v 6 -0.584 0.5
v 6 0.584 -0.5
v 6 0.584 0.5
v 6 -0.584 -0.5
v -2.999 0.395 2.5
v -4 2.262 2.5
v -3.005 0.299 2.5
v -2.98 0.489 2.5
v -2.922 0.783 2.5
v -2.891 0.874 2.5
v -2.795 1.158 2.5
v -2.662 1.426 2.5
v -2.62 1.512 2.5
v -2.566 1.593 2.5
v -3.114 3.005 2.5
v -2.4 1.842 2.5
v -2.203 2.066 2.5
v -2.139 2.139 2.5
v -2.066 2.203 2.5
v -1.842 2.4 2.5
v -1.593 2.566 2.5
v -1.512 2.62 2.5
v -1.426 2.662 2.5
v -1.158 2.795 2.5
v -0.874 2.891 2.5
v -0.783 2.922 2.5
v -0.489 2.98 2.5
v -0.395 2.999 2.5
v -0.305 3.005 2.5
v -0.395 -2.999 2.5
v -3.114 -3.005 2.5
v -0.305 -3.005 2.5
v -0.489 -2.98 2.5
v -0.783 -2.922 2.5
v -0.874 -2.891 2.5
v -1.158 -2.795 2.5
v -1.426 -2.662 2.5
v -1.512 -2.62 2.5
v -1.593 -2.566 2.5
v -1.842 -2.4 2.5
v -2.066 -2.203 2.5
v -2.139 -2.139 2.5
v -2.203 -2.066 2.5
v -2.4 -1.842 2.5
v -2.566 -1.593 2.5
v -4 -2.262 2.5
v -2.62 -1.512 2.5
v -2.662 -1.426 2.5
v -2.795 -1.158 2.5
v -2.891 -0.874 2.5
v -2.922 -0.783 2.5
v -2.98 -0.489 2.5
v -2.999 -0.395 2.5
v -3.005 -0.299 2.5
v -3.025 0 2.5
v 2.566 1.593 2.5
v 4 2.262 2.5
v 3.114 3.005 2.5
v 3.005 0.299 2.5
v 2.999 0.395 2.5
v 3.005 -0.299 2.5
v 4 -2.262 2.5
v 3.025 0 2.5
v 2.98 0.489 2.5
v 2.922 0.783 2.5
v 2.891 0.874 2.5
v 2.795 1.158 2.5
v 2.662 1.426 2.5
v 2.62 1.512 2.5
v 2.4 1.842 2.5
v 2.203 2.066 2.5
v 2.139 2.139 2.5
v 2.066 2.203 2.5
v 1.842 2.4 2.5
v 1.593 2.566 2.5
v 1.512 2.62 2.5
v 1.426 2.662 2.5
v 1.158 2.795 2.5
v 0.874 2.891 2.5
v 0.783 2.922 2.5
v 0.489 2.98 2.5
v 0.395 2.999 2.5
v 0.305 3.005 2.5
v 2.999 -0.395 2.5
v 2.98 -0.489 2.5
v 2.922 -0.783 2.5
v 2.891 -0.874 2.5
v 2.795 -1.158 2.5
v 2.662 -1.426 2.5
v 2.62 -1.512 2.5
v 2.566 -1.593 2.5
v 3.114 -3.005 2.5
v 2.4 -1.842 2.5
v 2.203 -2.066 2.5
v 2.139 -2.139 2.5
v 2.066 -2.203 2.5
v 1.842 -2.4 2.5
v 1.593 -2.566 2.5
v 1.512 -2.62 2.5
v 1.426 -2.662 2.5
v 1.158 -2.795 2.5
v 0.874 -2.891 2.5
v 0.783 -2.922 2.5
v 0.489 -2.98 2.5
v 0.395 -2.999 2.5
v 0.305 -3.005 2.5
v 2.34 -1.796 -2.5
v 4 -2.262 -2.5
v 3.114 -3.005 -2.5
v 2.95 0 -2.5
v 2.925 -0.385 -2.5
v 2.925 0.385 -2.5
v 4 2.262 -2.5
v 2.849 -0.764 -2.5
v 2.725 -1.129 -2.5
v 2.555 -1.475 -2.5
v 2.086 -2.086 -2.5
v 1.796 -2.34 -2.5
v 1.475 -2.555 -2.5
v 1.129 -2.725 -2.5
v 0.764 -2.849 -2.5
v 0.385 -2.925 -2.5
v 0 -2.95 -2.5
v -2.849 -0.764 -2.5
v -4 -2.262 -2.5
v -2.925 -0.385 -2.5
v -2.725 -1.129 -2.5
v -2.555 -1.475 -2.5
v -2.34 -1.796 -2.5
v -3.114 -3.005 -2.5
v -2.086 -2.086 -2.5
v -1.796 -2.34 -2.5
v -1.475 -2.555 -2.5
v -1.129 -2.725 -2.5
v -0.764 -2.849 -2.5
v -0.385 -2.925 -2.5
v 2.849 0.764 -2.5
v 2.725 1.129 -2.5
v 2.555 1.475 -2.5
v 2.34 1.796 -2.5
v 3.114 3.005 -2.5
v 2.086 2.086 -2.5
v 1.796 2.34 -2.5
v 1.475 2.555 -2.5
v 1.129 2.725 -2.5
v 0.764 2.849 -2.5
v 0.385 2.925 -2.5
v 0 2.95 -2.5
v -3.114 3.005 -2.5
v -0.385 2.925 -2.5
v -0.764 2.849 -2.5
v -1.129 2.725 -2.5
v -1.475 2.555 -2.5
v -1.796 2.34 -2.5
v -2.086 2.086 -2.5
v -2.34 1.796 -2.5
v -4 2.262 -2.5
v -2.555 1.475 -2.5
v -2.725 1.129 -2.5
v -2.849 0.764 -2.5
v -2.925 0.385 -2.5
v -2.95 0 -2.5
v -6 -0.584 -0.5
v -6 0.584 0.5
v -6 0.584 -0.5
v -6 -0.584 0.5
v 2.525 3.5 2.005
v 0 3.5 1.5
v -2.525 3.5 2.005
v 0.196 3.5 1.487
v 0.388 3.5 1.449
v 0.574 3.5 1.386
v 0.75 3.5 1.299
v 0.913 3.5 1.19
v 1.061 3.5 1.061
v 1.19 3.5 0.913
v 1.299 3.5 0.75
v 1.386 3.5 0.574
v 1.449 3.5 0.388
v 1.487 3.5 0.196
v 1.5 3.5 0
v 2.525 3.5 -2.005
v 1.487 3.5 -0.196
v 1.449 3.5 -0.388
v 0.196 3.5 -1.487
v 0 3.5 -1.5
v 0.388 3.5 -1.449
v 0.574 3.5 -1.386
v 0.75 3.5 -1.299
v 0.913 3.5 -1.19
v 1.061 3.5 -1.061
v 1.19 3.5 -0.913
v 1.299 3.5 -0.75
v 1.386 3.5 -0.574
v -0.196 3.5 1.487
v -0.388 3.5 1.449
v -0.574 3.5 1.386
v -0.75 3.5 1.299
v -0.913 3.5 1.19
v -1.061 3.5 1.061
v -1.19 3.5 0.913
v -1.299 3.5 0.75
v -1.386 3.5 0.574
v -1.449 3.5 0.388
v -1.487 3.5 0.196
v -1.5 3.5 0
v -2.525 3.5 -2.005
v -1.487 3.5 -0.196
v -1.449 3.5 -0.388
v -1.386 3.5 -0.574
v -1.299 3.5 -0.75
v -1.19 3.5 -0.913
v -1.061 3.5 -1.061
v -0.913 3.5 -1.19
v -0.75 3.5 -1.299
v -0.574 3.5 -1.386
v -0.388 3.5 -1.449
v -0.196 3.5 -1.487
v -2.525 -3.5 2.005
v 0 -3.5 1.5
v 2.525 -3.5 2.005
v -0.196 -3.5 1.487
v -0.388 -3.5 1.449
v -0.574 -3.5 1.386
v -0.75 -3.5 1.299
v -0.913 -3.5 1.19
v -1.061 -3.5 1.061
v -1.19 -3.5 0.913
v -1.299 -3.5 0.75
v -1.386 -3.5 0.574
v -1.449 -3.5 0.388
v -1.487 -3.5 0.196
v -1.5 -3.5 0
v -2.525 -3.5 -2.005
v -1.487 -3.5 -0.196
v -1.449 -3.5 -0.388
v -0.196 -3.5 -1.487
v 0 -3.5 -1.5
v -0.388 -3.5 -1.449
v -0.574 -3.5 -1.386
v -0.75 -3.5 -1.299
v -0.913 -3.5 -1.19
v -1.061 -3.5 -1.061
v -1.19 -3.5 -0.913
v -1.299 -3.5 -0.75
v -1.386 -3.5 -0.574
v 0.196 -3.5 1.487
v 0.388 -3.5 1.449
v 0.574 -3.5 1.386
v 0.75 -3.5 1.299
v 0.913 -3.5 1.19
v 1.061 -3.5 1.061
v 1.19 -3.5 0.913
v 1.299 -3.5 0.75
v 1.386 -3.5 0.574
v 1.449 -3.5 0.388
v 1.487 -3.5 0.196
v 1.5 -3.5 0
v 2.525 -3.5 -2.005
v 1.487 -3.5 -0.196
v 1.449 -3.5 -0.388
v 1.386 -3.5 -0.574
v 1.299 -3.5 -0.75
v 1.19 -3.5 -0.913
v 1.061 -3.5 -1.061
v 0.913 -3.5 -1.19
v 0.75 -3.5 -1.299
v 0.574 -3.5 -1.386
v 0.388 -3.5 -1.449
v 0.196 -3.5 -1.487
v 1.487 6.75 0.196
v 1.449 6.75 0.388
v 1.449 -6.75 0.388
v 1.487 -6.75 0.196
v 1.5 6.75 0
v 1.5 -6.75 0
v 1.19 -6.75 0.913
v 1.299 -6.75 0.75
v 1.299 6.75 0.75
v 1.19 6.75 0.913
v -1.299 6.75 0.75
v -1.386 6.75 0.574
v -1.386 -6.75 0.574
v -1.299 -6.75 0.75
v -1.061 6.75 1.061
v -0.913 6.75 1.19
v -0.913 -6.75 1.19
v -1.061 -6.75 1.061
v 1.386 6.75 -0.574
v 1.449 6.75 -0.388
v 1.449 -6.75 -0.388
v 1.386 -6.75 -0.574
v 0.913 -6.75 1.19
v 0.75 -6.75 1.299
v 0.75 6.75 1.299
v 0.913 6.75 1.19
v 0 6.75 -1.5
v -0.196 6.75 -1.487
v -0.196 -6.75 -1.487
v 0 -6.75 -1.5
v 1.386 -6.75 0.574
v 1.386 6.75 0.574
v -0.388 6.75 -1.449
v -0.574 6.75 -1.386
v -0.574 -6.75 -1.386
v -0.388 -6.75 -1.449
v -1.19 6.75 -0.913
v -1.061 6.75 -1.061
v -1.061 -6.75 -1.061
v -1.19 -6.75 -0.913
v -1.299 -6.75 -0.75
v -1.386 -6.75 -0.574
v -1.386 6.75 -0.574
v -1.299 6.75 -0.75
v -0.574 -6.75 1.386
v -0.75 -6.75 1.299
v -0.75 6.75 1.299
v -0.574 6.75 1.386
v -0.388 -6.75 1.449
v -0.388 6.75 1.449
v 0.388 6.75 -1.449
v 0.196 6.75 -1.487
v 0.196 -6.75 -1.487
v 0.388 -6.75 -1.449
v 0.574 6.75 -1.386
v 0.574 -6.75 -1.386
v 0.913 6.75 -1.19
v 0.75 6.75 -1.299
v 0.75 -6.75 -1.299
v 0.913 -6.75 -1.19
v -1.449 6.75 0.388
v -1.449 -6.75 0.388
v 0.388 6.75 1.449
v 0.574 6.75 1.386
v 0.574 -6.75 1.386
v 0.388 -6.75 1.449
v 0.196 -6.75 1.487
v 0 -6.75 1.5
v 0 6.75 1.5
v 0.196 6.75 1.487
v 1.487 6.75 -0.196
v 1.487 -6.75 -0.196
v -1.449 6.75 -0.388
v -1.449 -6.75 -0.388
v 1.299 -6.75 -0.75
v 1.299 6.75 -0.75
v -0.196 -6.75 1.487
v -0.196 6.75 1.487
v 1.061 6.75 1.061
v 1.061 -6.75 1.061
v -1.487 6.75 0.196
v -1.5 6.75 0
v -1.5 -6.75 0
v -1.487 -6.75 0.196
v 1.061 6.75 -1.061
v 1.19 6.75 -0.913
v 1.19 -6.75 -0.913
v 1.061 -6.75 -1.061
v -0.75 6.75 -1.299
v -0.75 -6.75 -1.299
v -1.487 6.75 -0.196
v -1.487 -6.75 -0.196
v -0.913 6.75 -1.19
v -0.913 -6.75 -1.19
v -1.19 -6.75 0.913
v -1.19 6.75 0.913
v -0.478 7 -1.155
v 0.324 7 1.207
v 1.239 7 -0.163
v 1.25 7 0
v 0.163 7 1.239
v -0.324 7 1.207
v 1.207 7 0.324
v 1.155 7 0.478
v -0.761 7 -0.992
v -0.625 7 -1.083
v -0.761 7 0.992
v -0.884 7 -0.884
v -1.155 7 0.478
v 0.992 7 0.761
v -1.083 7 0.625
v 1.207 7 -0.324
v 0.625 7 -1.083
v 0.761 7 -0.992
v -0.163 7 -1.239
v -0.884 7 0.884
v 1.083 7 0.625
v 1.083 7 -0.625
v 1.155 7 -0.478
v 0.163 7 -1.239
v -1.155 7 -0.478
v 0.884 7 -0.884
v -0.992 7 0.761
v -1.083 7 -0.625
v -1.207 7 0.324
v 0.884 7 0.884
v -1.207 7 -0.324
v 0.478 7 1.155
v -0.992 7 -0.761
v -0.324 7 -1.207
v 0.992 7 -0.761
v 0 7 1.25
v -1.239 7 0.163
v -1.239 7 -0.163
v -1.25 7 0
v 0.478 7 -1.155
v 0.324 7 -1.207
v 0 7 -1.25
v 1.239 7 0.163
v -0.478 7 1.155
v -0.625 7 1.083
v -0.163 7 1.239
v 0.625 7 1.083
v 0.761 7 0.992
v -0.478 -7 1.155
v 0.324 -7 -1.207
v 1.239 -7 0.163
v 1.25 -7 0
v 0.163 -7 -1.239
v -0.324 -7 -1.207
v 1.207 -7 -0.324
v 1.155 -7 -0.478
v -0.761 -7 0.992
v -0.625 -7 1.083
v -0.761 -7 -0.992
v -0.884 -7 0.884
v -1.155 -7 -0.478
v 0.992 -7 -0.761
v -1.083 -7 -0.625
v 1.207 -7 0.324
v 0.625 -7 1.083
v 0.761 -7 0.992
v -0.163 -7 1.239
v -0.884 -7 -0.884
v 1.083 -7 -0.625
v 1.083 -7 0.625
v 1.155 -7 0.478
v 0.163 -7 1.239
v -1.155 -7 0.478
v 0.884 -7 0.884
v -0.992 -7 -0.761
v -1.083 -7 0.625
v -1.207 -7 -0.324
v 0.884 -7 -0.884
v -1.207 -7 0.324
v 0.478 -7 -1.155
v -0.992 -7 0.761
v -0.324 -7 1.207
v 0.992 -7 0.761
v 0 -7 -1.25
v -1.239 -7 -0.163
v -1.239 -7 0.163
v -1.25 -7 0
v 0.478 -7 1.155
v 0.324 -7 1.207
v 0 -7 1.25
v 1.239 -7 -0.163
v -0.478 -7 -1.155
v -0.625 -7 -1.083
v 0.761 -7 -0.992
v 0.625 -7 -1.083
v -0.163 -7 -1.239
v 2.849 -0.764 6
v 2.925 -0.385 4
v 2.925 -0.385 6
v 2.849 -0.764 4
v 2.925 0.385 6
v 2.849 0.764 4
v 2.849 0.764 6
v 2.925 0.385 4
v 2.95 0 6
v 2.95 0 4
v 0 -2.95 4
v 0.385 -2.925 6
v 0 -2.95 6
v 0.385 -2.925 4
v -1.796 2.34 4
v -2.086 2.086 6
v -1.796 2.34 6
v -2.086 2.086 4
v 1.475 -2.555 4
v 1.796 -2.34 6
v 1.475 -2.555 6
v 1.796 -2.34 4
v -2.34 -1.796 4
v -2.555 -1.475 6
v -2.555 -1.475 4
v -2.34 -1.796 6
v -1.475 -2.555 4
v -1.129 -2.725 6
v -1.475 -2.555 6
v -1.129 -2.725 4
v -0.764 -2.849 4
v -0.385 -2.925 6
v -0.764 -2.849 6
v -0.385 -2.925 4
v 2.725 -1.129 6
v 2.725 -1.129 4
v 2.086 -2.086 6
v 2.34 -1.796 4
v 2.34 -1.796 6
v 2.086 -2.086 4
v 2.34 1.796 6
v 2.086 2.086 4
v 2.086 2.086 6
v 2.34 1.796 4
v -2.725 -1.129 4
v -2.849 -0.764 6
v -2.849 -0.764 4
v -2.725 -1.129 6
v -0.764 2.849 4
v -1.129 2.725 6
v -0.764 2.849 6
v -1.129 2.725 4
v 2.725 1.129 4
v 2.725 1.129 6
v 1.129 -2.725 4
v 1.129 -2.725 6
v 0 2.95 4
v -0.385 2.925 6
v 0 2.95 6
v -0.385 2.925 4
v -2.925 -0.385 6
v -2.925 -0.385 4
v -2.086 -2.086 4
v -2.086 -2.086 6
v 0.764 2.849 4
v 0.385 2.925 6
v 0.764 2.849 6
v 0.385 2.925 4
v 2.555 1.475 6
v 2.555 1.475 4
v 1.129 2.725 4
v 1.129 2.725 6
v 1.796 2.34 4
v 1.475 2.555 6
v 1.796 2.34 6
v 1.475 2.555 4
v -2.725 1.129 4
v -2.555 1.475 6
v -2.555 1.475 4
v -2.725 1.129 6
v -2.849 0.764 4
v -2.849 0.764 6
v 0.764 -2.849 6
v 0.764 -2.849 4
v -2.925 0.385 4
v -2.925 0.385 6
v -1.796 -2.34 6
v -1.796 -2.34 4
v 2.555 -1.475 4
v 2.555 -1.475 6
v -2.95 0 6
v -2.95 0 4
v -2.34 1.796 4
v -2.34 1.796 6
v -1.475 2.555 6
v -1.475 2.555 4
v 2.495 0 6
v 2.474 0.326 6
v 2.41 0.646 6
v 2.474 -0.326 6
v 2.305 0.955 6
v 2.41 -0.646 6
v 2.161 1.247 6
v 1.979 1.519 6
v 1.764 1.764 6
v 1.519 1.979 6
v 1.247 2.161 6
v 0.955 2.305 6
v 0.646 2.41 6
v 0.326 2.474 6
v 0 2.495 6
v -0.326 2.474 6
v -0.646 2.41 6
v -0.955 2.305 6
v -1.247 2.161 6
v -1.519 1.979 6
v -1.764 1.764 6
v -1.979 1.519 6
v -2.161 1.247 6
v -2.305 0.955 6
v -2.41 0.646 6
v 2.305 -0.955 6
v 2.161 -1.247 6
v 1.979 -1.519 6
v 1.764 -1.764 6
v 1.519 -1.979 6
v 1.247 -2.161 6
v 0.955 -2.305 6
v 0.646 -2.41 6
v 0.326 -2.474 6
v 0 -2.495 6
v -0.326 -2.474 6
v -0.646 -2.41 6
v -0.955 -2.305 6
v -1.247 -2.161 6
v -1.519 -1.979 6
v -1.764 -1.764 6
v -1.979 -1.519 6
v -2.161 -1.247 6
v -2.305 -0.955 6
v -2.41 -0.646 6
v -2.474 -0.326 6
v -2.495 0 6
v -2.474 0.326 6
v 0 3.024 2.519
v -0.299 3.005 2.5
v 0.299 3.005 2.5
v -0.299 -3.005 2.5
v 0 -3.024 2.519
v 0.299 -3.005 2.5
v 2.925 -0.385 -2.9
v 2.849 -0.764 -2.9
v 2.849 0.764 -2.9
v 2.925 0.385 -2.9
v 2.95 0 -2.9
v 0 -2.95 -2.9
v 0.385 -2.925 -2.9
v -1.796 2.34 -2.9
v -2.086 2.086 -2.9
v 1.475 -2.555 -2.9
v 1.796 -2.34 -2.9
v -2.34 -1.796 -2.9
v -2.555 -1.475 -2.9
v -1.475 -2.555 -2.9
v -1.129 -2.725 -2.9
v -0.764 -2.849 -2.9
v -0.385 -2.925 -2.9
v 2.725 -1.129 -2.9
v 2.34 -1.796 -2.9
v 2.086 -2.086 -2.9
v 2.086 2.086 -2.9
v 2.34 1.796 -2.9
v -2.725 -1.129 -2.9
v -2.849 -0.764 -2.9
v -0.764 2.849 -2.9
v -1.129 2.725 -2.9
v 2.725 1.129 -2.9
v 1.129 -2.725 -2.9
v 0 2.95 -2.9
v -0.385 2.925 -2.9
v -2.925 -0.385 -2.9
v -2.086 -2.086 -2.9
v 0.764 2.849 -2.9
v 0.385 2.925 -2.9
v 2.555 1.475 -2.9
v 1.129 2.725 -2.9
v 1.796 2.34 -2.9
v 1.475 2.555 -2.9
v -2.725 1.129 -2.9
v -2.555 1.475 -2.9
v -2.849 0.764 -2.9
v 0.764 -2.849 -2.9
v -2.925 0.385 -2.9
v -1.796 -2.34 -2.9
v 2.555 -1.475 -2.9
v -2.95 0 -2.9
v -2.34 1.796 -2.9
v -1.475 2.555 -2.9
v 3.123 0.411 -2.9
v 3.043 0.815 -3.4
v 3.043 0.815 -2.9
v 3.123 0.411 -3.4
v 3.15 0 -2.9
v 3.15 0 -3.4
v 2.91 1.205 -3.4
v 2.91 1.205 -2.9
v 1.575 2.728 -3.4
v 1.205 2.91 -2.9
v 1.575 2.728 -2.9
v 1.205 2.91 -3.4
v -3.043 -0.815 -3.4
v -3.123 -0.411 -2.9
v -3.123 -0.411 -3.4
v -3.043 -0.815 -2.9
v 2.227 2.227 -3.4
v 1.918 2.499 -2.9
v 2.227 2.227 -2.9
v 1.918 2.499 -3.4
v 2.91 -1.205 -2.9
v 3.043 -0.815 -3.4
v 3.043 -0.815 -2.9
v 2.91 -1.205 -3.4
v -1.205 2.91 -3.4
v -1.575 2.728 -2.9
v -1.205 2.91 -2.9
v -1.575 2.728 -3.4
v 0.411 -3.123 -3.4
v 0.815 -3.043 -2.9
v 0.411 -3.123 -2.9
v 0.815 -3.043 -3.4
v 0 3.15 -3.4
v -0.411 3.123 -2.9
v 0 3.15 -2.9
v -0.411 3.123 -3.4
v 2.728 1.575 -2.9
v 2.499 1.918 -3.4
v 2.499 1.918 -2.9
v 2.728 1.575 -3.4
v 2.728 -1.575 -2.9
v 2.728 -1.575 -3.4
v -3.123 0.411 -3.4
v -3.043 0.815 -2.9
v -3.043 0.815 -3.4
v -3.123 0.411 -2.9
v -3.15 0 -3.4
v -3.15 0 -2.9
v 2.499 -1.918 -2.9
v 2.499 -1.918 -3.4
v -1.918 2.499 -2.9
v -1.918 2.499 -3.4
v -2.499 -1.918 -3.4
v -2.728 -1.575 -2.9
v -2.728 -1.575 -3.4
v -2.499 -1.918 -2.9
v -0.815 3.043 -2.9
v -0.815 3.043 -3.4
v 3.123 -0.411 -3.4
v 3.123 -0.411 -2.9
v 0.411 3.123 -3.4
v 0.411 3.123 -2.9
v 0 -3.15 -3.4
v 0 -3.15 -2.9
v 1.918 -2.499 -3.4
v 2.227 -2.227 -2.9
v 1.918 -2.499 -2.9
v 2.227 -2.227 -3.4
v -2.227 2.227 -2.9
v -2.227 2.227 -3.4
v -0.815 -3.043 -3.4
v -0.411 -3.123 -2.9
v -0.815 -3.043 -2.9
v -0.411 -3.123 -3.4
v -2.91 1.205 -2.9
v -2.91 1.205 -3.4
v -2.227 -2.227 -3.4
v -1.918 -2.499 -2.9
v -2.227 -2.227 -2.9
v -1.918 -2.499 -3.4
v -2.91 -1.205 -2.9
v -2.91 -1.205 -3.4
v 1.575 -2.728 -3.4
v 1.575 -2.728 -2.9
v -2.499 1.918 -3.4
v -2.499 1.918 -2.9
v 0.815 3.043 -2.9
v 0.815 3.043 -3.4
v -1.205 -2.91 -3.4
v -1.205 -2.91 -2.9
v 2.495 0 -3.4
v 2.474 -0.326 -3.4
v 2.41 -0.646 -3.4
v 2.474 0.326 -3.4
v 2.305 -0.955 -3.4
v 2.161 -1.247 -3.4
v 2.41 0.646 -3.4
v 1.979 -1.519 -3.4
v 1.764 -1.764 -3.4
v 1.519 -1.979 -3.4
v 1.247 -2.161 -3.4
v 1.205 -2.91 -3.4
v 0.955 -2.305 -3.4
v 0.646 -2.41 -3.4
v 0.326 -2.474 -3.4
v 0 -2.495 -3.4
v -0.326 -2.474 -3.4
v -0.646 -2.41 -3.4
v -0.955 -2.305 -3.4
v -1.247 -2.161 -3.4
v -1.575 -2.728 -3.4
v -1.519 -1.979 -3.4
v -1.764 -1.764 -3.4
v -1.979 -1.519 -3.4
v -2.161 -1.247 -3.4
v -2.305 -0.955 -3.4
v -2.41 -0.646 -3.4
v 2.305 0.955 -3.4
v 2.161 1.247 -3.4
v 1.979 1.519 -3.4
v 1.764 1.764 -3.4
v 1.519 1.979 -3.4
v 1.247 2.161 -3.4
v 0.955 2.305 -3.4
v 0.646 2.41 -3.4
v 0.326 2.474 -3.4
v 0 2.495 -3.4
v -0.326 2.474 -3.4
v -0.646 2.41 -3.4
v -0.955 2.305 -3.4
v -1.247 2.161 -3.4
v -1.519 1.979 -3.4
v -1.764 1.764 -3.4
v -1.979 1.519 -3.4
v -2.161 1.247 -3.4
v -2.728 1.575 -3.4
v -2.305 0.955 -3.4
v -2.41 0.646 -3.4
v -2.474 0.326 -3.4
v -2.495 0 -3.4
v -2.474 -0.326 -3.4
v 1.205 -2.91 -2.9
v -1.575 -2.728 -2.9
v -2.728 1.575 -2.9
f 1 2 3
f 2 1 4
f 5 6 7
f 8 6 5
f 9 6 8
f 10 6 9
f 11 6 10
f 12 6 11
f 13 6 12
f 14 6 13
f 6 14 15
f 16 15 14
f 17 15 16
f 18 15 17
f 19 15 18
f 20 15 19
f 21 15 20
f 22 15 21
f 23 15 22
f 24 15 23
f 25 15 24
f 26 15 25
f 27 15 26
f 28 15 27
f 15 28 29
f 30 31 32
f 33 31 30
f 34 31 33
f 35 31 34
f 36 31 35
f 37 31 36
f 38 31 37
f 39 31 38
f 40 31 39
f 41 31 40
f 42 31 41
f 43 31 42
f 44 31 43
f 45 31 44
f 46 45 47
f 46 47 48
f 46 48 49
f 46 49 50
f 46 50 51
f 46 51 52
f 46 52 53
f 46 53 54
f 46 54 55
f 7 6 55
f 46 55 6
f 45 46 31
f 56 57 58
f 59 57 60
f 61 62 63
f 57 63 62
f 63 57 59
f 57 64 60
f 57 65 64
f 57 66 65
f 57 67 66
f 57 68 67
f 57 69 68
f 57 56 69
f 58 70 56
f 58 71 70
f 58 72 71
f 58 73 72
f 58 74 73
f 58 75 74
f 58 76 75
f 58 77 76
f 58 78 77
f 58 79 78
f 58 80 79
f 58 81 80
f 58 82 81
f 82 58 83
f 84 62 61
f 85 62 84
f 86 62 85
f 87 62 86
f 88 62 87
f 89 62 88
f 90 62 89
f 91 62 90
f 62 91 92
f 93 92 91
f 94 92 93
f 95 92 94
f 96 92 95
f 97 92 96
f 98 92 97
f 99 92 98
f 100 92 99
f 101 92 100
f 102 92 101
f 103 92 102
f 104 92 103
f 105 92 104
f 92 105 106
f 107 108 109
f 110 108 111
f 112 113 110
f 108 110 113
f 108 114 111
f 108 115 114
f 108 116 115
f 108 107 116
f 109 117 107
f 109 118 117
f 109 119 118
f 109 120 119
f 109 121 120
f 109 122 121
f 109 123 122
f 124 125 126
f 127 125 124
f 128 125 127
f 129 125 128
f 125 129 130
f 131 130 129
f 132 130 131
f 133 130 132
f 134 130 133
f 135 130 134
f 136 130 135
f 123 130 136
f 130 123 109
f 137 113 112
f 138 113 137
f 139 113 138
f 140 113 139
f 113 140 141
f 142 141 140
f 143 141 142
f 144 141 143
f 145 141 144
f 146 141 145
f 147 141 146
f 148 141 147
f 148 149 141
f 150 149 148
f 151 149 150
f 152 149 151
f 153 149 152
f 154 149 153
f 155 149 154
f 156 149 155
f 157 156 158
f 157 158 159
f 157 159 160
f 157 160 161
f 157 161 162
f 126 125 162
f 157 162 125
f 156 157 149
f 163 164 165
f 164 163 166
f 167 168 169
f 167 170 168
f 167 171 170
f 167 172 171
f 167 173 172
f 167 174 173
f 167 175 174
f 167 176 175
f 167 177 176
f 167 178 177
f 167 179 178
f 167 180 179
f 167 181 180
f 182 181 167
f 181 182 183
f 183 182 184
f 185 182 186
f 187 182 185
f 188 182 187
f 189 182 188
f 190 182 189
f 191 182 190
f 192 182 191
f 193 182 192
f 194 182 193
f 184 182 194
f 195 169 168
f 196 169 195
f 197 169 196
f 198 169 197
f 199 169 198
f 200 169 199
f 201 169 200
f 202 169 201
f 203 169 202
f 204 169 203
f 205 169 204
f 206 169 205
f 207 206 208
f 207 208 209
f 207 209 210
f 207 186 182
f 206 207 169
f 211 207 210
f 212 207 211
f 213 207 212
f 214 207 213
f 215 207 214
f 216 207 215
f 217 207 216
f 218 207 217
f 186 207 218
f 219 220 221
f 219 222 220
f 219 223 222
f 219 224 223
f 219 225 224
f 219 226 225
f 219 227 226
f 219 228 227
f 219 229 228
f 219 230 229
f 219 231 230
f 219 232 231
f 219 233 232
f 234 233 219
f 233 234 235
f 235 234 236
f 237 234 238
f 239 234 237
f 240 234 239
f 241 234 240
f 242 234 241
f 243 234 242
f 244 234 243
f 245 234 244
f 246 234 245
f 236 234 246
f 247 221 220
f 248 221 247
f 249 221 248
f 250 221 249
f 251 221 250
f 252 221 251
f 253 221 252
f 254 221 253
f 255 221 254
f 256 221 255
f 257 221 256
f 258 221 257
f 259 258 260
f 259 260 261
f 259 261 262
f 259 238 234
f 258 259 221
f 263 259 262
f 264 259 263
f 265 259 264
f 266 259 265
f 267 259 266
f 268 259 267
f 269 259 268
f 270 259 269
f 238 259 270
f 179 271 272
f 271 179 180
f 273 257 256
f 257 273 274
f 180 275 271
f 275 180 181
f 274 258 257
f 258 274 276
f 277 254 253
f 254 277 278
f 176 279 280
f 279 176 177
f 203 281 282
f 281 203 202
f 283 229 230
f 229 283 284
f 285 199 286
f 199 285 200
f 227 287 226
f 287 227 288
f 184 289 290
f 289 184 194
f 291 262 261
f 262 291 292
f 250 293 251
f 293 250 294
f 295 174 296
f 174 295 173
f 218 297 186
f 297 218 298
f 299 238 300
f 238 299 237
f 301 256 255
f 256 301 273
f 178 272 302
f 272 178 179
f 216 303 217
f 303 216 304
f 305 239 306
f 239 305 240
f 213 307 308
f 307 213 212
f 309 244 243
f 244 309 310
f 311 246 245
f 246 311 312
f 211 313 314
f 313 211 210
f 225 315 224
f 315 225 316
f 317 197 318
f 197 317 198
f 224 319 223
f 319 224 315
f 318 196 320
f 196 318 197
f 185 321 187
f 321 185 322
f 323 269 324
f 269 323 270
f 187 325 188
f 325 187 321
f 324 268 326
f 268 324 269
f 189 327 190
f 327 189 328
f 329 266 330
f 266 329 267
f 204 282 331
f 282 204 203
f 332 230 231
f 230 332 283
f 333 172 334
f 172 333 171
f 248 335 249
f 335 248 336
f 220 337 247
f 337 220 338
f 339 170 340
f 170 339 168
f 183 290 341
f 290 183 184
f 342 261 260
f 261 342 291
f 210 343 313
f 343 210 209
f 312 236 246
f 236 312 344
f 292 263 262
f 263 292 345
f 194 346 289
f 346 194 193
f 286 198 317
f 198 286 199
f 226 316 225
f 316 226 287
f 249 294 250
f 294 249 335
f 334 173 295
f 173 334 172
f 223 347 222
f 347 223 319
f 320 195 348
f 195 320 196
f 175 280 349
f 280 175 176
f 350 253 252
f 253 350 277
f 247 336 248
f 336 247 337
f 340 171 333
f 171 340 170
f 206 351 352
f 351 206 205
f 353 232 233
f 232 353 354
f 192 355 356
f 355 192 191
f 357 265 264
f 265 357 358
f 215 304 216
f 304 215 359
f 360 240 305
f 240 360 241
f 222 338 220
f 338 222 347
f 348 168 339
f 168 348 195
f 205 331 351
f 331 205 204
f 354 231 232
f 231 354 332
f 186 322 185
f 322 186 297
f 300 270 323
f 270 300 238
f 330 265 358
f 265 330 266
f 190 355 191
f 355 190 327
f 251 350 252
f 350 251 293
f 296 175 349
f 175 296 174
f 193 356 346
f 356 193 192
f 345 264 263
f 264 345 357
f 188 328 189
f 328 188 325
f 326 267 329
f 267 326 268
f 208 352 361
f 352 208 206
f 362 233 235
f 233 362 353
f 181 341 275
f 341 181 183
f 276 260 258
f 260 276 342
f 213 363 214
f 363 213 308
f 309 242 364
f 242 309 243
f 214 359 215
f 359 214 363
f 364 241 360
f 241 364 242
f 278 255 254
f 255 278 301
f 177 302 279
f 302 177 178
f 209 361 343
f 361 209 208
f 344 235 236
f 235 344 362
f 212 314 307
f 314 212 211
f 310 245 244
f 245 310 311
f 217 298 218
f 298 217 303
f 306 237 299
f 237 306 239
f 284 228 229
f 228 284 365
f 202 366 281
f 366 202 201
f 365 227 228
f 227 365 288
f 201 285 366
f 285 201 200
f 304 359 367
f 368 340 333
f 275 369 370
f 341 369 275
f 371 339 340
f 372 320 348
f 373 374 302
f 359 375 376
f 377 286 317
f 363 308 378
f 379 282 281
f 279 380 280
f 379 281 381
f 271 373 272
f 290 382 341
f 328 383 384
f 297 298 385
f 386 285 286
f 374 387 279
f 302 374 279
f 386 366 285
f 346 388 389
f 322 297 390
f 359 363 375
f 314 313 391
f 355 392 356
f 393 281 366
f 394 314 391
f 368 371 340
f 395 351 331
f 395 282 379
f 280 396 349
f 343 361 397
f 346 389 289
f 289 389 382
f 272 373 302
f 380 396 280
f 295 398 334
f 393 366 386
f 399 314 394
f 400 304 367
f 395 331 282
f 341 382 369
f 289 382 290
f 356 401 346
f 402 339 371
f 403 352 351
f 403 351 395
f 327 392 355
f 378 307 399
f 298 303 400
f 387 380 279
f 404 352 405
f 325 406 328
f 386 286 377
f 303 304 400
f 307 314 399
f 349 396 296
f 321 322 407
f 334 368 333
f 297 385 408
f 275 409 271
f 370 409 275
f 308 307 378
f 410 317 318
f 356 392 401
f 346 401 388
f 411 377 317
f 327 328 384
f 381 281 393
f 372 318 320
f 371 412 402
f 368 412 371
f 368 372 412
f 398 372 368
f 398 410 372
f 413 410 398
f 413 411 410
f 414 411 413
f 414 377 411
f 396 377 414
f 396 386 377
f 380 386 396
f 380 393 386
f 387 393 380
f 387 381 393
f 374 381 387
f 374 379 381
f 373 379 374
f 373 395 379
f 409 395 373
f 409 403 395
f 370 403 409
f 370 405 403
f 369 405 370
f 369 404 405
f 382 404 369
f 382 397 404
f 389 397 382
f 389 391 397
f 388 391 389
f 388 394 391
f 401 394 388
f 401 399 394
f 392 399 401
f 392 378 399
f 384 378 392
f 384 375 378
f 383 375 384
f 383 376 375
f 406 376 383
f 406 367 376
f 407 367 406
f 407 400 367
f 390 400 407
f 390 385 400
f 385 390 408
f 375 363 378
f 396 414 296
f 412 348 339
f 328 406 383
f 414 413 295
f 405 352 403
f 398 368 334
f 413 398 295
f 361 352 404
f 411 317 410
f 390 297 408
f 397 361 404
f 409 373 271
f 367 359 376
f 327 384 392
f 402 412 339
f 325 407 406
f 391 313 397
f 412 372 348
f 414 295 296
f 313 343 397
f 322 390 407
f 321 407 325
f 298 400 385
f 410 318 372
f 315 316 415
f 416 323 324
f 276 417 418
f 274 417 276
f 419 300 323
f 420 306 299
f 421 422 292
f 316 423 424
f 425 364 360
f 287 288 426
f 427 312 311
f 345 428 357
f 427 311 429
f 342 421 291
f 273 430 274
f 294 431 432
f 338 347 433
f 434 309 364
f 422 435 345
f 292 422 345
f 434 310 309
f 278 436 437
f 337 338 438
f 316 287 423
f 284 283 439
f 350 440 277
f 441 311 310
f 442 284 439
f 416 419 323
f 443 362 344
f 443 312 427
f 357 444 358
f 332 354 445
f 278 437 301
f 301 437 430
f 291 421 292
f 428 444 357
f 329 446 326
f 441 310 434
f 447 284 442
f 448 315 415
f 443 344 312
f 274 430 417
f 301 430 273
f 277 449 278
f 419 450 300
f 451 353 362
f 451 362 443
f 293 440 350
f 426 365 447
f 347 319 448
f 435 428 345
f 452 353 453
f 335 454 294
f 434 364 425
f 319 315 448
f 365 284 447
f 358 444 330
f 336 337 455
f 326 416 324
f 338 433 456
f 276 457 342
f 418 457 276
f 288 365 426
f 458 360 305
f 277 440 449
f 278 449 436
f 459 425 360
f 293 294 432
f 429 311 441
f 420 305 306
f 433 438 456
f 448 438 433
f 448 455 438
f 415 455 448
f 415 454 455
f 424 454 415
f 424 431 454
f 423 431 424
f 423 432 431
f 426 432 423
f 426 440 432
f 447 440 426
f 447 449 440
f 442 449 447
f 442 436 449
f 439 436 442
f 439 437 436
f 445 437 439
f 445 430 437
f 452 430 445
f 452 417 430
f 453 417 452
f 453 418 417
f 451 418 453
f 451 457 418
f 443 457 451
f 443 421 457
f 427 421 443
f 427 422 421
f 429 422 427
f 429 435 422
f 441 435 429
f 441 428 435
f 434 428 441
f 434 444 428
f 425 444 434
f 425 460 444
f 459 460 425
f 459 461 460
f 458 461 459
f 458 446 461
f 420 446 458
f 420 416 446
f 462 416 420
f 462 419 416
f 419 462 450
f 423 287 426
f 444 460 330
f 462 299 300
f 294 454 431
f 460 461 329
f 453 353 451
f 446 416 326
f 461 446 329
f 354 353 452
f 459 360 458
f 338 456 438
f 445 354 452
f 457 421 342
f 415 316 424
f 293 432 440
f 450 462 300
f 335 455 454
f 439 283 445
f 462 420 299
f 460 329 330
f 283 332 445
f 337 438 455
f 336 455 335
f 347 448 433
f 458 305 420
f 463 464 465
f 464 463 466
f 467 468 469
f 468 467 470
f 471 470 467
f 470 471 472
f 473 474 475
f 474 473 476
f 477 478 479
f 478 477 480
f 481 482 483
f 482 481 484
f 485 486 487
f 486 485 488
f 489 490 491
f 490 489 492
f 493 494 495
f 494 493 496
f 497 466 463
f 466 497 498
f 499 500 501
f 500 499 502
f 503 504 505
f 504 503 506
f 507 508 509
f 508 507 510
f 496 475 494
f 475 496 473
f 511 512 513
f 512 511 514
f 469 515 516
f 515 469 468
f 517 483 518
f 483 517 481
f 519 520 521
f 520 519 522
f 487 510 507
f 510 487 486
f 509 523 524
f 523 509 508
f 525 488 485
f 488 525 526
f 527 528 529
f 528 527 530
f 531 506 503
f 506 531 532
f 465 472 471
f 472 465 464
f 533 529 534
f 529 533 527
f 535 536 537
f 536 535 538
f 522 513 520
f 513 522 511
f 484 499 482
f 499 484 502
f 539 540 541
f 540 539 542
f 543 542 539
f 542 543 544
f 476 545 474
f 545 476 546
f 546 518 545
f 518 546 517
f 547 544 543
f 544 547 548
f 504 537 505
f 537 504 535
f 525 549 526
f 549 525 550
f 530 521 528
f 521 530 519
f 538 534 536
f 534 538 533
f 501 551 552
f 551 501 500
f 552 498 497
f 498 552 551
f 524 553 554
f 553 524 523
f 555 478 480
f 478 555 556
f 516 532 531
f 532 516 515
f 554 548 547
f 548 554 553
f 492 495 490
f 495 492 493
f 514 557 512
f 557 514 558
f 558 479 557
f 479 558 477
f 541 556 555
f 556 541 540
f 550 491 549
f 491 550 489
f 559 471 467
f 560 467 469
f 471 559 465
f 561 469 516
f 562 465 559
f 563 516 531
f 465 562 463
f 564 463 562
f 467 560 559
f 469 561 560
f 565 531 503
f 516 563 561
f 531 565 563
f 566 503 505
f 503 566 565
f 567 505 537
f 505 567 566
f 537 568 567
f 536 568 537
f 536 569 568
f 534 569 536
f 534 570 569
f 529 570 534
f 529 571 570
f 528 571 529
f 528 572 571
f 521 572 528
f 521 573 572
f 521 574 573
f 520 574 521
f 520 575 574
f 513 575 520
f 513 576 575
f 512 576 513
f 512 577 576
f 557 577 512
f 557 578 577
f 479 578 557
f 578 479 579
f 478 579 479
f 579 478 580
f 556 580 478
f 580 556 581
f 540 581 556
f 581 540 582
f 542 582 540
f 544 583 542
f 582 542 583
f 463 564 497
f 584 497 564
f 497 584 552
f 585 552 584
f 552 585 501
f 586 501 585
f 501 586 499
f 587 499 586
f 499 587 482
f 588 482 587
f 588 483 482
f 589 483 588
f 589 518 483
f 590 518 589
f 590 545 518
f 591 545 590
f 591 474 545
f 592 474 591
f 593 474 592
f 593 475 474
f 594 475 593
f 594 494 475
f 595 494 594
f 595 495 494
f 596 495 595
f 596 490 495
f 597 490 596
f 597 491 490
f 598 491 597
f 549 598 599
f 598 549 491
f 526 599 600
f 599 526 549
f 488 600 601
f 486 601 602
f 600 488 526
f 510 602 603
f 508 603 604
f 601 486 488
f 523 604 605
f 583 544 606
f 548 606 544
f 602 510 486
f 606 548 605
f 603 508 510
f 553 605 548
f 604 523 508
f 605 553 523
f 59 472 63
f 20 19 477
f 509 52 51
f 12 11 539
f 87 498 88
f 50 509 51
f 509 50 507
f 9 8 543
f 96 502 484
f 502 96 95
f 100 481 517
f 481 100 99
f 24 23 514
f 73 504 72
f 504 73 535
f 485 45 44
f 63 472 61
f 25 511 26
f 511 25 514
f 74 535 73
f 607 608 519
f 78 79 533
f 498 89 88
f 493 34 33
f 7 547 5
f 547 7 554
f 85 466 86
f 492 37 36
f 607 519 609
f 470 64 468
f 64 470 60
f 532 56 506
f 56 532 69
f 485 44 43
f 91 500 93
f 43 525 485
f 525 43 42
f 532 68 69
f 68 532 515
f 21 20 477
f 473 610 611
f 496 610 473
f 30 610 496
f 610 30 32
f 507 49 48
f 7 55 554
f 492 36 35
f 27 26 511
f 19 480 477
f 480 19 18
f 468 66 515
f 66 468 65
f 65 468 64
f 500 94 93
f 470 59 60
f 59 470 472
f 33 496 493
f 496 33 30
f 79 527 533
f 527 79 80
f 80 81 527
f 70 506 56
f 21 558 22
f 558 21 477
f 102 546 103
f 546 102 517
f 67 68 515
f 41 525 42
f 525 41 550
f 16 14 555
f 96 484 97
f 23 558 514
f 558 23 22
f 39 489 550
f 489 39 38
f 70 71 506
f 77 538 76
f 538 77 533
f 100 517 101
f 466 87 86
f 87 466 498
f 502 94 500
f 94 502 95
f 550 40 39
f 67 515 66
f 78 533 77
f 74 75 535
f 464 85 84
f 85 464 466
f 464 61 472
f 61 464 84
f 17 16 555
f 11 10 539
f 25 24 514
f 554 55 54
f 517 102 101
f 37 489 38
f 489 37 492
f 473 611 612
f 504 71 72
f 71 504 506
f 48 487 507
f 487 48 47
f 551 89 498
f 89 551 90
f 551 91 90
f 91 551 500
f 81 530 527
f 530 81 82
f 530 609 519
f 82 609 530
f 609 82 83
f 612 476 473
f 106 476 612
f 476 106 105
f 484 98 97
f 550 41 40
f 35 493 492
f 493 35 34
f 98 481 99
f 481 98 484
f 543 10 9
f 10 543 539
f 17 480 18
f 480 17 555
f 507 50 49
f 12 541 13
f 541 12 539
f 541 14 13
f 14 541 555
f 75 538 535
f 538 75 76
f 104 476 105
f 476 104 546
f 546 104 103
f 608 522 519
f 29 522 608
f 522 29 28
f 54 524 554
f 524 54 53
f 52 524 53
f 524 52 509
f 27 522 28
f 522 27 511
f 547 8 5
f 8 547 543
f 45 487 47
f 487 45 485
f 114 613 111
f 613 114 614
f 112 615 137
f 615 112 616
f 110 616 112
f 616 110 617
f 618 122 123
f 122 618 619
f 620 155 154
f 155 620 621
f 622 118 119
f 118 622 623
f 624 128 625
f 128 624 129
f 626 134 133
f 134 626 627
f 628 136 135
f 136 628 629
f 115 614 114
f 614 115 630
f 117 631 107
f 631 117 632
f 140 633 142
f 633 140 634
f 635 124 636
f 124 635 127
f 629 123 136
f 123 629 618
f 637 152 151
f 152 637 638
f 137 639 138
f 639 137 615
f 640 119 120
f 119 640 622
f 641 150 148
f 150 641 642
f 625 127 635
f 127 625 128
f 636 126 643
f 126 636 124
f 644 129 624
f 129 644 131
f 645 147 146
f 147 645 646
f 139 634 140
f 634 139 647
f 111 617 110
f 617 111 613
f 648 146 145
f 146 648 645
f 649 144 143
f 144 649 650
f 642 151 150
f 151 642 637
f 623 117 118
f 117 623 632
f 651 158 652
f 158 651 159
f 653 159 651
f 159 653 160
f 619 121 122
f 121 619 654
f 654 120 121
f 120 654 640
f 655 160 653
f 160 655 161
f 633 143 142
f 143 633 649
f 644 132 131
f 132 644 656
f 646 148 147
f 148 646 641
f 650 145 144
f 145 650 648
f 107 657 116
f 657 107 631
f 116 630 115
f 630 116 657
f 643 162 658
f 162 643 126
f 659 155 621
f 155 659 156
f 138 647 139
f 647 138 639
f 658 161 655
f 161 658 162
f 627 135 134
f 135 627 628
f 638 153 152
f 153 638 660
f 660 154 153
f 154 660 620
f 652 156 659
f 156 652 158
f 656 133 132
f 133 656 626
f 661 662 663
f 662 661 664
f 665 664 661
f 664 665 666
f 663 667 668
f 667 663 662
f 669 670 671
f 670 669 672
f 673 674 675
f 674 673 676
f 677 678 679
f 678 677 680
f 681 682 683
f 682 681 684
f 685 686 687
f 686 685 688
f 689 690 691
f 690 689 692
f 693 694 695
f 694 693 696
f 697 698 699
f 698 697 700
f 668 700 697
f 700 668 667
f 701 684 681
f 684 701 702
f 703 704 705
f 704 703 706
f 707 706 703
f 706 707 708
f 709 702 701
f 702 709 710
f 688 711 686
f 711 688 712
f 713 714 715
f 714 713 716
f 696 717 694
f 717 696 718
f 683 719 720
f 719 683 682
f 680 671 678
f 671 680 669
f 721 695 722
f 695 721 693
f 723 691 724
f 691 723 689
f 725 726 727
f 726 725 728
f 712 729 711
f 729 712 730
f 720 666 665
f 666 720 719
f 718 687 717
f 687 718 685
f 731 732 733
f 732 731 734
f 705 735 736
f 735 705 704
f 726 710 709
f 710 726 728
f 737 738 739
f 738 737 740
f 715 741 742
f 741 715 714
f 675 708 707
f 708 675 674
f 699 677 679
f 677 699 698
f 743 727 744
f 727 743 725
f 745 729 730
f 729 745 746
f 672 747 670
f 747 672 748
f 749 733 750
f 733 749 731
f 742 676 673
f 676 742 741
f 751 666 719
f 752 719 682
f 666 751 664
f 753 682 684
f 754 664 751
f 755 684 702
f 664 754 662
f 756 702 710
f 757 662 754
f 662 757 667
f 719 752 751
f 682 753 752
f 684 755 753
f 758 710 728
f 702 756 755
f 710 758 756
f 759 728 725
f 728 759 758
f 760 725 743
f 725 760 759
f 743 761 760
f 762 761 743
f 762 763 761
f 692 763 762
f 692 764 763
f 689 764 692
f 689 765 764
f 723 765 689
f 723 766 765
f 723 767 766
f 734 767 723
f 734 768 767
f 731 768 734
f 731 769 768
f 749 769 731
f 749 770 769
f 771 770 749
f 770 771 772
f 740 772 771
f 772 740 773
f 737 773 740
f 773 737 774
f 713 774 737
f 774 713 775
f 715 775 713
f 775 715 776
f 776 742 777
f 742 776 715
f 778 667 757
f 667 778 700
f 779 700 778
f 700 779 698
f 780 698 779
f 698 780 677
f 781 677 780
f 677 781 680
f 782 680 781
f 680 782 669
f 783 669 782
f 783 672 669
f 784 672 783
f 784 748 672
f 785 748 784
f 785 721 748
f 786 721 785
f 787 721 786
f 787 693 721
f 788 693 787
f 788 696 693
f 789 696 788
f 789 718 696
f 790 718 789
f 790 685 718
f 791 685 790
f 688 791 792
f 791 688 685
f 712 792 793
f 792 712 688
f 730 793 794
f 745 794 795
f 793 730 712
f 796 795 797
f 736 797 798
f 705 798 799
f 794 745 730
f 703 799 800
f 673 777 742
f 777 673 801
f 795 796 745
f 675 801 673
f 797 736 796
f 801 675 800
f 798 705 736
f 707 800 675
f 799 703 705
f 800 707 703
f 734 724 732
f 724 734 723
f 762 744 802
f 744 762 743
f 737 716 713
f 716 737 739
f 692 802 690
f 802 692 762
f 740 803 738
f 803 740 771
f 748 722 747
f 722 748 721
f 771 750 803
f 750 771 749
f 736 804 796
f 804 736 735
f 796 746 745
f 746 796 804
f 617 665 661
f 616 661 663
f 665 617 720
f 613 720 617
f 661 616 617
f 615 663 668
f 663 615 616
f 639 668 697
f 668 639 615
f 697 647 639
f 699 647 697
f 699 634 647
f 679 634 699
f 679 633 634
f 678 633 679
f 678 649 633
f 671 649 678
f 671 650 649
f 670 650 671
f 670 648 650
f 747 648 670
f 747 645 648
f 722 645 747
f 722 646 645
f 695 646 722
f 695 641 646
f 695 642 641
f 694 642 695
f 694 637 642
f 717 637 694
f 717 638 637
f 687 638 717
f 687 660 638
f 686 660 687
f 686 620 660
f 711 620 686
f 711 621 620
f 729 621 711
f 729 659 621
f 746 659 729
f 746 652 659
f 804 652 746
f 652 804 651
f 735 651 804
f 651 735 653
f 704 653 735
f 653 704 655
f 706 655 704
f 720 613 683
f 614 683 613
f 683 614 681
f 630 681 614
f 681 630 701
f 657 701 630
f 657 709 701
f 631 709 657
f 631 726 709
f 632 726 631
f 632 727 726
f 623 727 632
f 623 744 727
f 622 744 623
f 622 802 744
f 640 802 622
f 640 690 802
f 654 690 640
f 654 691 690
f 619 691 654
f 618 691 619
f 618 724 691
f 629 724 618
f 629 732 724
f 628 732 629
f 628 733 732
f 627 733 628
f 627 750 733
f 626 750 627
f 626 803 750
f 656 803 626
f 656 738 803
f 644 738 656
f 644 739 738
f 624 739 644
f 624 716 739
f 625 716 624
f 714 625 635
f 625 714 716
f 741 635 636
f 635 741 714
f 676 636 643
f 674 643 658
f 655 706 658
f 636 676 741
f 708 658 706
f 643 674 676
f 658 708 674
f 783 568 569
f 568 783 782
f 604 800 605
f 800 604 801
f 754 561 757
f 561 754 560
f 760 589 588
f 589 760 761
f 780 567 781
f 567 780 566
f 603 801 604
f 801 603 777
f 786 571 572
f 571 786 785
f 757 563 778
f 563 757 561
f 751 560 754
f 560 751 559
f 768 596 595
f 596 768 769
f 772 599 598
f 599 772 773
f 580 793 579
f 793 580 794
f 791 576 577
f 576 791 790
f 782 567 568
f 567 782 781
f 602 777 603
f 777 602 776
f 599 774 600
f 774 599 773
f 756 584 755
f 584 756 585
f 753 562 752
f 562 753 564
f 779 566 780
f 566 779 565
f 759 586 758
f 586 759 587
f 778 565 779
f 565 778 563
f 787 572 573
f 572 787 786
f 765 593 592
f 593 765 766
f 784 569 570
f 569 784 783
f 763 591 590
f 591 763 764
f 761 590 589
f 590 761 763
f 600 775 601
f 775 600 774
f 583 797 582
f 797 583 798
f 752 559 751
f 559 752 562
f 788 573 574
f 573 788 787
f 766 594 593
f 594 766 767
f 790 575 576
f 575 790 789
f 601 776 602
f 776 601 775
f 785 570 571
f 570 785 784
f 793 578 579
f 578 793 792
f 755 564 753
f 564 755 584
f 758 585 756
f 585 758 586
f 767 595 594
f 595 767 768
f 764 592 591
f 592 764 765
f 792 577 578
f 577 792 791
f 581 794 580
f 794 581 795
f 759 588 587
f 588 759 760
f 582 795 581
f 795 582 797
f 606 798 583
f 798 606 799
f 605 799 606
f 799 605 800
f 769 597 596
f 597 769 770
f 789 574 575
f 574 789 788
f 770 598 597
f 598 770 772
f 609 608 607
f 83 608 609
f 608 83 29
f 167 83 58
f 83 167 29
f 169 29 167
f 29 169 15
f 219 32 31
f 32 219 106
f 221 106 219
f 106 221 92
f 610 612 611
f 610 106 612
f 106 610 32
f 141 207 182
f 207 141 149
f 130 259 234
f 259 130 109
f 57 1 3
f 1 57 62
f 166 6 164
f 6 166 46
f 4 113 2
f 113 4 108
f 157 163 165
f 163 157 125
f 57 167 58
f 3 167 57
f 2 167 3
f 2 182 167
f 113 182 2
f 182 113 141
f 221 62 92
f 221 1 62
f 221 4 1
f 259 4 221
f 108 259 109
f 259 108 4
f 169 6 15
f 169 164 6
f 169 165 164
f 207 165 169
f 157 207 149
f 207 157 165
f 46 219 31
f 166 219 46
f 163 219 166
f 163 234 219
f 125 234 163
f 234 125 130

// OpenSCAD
// ----------------------------------------------------------------------------------------------------
// PROJECT INFORMATION
// NAME:  R/C Mower Trailer
// REVISION:  A1
// START DATE:  8/20/2021
// CURRENT VERSION DATE:  9/8/2021
// LICENSE:  GPLv3
// AUTHOR:  Justin Grimes (@zelon88)
// DESCRIPTION:  A tow-behind lawn mowing attachment for retrofit onto low-speed R/C vehicles.
// ----------------------------------------------------------------------------------------------------

// ----------------------------------------------------------------------------------------------------
// PART INFORMATION
// NAME:  Attachment Adjustment Arm Insert
// REVISION:  A1
// START DATE:  5/28/2026
// CURRENT VERSION DATE:  5/28/2026
// AUTHOR:  Justin Grimes (@zelon88) & Copilot - Claude Sonnet 4.6.
// DESCRIPTION:
//    An insert for the attachment adjustment arm assembly.
//    Features a rectangular center block with side bosses and a center boss for an adjustment screw.
//    All exposed edges are chamfered for a clean finish.
// FILE NAME: Attachment_Adjustment_Arm_Insert.scad
// ----------------------------------------------------------------------------------------------------

module Attachment_Adjustment_Arm_Insert() {
  difference() {
    union() {
      // Create the rectangular center block.
      cube([12, 7, 5], center=true);   
      // Main body of pin.
      translate([0, 0, 0]) rotate([90, 0, 0]) cylinder($fn=48, r=1.5, h=13.5, center=true);
      // Front chamfer cap.
      translate([0, 6.75, 0]) rotate([-90, 0, 0]) cylinder($fn=48, r1=1.5, r2=1.25, h=0.25); 
      // Back chamfer cap.
      translate([0, -6.75, 0]) rotate([90, 0, 0]) cylinder($fn=48, r1=1.5, r2=1.25, h=0.25);
      // Create the center boss.
      translate([0, 0, 4]) cylinder($fn=48, r=2.95, h=4, center=true);
      // Taper the base of the upper portion of the center boss for strength.
      translate([0, 0, 3]) cylinder($fn=48, r1=3.05, r2=2.95, h=2, center=true);
      // Chamfer the bottom of the center boss to support a shrink wrap dust boot.
      translate([0, 0, -2.5]) cylinder($fn=48, r=2.95, h=1.5, center=true); 
      // Add a lip to the bottom of the center boss to support a shrink wrap dust boot.
      translate([0, 0, -3.15]) cylinder($fn=48, r=3.15, h=0.5, center=true); }
    
    // Drill the center hole for the adjustment screw.
    cylinder($fn=48, r=2.495, h=15, center=true);
    
    // Chamfer the front & rear top & bottom edges along X axis.
    translate([0,  3.5,  2.5]) rotate([45, 0, 0]) cube([14, 0.7, 0.7], center=true);
    translate([0, -3.5,  2.5]) rotate([45, 0, 0]) cube([14, 0.7, 0.7], center=true);
    translate([0,  3.5, -2.5]) rotate([45, 0, 0]) cube([14, 0.7, 0.7], center=true);
    translate([0, -3.5, -2.5]) rotate([45, 0, 0]) cube([14, 0.7, 0.7], center=true);
    
    // Chamfer the left & right top & bottom edges along Y axis.
    translate([ 6, 0,  2.5]) rotate([0, 45, 0]) cube([2.828, 9, 2.828], center=true);
    translate([-6, 0,  2.5]) rotate([0, 45, 0]) cube([2.828, 9, 2.828], center=true);
    translate([ 6, 0, -2.5]) rotate([0, 45, 0]) cube([2.828, 9, 2.828], center=true);
    translate([-6, 0, -2.5]) rotate([0, 45, 0]) cube([2.828, 9, 2.828], center=true);
    
    // Chamfer the vertical corner edges along Z axis (tips of the Y axis wedges).
    translate([ 6,  4.5, 0]) rotate([0, 0, 50]) cube([6, 6, 6], center=true);
    translate([ 6, -4.5, 0]) rotate([0, 0, 40]) cube([6, 6, 6], center=true);
    translate([-6,  4.5, 0]) rotate([0, 0, 40]) cube([6, 6, 6], center=true);
    translate([-6, -4.5, 0]) rotate([0, 0, 50]) cube([6, 6, 6], center=true); } }

// Render the object.
Attachment_Adjustment_Arm_Insert();
